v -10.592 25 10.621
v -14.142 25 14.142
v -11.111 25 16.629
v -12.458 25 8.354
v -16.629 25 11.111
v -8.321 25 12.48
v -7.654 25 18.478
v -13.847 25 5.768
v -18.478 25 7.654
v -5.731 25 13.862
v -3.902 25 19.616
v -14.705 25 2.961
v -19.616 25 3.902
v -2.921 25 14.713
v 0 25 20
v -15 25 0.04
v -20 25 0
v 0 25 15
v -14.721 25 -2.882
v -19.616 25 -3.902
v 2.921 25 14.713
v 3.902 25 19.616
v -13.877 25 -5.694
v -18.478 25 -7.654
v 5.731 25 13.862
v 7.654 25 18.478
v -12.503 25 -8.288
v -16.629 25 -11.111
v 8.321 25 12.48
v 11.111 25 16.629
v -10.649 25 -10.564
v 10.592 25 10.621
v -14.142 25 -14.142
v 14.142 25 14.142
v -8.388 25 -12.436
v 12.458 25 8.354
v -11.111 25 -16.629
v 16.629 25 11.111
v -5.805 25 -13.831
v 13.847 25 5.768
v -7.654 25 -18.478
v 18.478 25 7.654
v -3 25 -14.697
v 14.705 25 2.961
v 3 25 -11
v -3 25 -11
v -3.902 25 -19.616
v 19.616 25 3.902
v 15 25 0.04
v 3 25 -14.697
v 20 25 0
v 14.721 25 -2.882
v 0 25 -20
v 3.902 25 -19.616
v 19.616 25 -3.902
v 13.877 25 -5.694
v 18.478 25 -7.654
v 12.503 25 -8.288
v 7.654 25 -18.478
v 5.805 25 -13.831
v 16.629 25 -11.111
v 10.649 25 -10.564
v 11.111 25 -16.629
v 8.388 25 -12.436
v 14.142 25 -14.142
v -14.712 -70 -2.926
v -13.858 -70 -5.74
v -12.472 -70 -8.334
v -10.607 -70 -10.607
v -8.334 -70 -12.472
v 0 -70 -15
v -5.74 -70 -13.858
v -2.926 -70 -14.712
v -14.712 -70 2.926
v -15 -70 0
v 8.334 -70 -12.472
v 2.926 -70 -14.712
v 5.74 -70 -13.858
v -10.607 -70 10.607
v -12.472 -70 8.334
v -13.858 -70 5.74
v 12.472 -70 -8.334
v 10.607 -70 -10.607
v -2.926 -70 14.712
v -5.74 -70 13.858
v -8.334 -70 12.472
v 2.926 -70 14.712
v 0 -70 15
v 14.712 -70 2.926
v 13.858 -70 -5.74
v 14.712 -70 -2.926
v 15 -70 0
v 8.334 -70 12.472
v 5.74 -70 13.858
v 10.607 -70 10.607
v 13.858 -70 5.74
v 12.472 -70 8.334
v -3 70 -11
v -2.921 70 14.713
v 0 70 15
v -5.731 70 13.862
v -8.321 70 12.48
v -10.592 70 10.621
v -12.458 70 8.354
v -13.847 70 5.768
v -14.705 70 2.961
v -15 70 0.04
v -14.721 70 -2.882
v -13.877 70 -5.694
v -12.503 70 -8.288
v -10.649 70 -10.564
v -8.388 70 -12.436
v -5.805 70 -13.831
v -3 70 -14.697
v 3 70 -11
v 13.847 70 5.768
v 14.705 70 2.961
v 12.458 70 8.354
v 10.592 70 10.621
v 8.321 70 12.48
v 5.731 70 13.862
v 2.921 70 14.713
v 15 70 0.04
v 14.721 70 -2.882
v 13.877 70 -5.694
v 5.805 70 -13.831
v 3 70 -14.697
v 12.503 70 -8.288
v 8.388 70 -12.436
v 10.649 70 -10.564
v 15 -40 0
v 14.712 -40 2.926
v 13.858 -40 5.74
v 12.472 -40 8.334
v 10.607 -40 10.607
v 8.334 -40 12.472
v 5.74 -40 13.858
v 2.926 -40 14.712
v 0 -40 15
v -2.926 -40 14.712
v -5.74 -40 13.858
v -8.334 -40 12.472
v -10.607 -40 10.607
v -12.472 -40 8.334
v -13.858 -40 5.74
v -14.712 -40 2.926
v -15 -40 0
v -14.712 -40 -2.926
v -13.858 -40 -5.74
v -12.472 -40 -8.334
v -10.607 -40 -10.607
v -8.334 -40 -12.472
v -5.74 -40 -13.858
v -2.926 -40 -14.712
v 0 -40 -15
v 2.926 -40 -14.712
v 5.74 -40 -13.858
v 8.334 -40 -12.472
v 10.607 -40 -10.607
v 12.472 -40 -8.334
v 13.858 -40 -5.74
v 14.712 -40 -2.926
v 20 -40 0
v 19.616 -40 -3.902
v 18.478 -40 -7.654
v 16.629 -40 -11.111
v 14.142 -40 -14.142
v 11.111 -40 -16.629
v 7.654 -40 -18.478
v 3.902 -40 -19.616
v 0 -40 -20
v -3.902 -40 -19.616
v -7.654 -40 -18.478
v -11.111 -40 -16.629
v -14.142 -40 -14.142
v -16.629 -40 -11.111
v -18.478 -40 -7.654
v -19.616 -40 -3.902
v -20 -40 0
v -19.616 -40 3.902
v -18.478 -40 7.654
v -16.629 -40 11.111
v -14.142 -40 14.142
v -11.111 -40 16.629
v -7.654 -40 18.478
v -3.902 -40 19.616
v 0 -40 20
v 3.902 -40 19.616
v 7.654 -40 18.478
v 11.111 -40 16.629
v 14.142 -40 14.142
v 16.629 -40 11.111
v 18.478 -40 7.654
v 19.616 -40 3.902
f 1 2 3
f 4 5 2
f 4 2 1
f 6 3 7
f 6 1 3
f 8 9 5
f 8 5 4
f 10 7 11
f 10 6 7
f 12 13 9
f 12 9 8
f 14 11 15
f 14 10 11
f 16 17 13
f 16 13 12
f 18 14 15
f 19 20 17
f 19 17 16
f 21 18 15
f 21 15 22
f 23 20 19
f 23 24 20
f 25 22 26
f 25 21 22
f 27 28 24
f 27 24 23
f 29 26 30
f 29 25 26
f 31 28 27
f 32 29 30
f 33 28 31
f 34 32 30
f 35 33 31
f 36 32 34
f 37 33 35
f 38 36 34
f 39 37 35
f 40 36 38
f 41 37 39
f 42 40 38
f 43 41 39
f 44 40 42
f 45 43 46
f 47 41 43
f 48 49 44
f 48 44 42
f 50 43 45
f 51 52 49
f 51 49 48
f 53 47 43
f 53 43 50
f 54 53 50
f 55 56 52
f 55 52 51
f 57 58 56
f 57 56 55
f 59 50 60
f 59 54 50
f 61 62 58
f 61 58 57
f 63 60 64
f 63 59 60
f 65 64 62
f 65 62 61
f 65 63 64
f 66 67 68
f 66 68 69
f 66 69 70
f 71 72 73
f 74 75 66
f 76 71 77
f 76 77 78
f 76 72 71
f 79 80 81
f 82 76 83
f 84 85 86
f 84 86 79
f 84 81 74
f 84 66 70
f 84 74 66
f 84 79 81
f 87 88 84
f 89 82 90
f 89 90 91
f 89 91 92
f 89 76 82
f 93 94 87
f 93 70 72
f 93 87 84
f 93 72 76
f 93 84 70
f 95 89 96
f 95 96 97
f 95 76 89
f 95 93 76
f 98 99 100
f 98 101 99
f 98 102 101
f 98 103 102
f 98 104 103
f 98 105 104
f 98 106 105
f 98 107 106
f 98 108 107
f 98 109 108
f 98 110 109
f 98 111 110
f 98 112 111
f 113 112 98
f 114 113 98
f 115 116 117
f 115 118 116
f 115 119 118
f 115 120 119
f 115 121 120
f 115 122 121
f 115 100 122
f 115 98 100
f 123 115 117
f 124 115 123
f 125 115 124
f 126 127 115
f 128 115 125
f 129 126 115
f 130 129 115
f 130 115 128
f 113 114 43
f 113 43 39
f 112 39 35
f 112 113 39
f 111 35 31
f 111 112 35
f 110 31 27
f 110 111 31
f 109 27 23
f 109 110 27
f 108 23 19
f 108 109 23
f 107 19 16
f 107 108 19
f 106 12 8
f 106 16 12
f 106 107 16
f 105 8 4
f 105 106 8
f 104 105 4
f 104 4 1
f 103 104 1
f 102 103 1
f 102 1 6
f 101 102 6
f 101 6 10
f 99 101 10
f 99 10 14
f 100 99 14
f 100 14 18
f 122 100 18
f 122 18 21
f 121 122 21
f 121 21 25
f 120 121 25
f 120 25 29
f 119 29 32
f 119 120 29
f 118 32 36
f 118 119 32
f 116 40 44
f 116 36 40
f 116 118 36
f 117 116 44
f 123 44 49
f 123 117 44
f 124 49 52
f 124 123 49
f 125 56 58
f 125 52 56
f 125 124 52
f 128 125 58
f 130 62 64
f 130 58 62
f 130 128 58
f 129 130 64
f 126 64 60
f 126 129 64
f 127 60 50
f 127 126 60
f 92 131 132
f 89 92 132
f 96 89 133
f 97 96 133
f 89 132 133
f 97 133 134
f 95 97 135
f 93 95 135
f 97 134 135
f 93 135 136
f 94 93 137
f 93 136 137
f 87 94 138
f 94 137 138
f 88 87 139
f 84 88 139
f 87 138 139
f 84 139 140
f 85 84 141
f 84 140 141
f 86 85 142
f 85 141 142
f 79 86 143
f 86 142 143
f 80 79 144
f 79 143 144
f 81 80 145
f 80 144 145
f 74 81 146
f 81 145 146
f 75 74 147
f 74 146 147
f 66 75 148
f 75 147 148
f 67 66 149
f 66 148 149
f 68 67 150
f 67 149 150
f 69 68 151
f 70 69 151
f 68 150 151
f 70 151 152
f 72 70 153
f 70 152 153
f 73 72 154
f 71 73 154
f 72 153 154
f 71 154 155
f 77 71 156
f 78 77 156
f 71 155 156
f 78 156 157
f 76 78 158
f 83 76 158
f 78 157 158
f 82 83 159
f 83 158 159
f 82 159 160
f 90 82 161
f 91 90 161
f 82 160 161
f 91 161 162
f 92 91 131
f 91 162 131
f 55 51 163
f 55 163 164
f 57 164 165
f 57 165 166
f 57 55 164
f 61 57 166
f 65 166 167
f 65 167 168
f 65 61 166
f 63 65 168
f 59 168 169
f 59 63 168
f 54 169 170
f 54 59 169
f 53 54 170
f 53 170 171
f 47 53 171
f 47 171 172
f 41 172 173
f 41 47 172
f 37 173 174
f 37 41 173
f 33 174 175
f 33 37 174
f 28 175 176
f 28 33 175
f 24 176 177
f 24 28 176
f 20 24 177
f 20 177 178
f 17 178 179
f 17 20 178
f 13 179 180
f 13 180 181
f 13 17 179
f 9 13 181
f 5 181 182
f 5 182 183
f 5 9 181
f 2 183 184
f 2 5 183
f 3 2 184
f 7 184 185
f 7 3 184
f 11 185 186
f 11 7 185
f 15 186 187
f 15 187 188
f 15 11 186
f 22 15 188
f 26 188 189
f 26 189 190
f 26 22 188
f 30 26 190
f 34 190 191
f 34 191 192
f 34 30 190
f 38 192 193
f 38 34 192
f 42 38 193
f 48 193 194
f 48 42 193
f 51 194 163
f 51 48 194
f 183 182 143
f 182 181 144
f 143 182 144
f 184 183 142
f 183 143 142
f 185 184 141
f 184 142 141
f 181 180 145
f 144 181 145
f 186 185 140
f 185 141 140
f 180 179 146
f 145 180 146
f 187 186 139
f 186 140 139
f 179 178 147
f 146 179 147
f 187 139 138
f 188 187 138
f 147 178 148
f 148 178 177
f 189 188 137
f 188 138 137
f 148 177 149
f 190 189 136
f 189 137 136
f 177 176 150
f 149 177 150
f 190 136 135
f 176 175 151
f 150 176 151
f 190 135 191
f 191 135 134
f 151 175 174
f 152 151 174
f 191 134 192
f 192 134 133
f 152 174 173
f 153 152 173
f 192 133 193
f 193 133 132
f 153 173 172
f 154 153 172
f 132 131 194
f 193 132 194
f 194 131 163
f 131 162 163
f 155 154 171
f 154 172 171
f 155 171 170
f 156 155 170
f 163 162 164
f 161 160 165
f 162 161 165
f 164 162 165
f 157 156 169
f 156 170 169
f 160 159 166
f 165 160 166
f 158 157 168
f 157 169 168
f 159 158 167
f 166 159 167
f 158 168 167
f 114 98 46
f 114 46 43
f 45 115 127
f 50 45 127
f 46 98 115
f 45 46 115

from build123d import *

# Parameters (mm, degrees)
SKETCH1_R           = 20
BOSS_EXTRUDE1_DEPTH = 40
SKETCH2_R           = 15
BOSS_EXTRUDE2_DEPTH = 30
SKETCH3_R           = 15
BOSS_EXTRUDE3_DEPTH = 30
SKETCH4_R           = 20
SKETCH4_R_2         = 15
CUT_EXTRUDE1_DEPTH  = 15
SKETCH5_W           = 6
SKETCH5_H           = 8
CUT_EXTRUDE2_DEPTH  = 45


with BuildPart() as part:
    # Sketch1 → Boss-Extrude1 (new body, symmetric)
    with BuildSketch(Plane(origin=(0, 0, 0), x_dir=(1, 0, 0), z_dir=(0, 1, 0))):
        Circle(SKETCH1_R)
    extrude(amount=BOSS_EXTRUDE1_DEPTH, both=True)

    # Sketch2 → Boss-Extrude2 (add)
    with BuildSketch(Plane(origin=(0, 40, 0), x_dir=(1, 0, 0), z_dir=(0, 1, 0))):
        Circle(SKETCH2_R)
    extrude(amount=BOSS_EXTRUDE2_DEPTH)

    # Sketch3 → Boss-Extrude3 (add)
    with BuildSketch(Plane.XZ.offset(40)):
        Circle(SKETCH3_R)
    extrude(amount=BOSS_EXTRUDE3_DEPTH)

    # Sketch4 → Cut-Extrude1 (cut)
    with BuildSketch(Plane(origin=(0, 40, 0), x_dir=(1, 0, 0), z_dir=(0, 1, 0))):
        Circle(SKETCH4_R)
        Circle(SKETCH4_R_2, mode=Mode.SUBTRACT)
    extrude(amount=-CUT_EXTRUDE1_DEPTH, mode=Mode.SUBTRACT)

    # Sketch5 → Cut-Extrude2 (cut)
    with BuildSketch(Plane(origin=(0, 70, 0), x_dir=(1, 0, 0), z_dir=(0, 1, 0))):
        with Locations((0, 15)):
            Rectangle(SKETCH5_W, SKETCH5_H)
    extrude(amount=-CUT_EXTRUDE2_DEPTH, mode=Mode.SUBTRACT)


solid = part.part
